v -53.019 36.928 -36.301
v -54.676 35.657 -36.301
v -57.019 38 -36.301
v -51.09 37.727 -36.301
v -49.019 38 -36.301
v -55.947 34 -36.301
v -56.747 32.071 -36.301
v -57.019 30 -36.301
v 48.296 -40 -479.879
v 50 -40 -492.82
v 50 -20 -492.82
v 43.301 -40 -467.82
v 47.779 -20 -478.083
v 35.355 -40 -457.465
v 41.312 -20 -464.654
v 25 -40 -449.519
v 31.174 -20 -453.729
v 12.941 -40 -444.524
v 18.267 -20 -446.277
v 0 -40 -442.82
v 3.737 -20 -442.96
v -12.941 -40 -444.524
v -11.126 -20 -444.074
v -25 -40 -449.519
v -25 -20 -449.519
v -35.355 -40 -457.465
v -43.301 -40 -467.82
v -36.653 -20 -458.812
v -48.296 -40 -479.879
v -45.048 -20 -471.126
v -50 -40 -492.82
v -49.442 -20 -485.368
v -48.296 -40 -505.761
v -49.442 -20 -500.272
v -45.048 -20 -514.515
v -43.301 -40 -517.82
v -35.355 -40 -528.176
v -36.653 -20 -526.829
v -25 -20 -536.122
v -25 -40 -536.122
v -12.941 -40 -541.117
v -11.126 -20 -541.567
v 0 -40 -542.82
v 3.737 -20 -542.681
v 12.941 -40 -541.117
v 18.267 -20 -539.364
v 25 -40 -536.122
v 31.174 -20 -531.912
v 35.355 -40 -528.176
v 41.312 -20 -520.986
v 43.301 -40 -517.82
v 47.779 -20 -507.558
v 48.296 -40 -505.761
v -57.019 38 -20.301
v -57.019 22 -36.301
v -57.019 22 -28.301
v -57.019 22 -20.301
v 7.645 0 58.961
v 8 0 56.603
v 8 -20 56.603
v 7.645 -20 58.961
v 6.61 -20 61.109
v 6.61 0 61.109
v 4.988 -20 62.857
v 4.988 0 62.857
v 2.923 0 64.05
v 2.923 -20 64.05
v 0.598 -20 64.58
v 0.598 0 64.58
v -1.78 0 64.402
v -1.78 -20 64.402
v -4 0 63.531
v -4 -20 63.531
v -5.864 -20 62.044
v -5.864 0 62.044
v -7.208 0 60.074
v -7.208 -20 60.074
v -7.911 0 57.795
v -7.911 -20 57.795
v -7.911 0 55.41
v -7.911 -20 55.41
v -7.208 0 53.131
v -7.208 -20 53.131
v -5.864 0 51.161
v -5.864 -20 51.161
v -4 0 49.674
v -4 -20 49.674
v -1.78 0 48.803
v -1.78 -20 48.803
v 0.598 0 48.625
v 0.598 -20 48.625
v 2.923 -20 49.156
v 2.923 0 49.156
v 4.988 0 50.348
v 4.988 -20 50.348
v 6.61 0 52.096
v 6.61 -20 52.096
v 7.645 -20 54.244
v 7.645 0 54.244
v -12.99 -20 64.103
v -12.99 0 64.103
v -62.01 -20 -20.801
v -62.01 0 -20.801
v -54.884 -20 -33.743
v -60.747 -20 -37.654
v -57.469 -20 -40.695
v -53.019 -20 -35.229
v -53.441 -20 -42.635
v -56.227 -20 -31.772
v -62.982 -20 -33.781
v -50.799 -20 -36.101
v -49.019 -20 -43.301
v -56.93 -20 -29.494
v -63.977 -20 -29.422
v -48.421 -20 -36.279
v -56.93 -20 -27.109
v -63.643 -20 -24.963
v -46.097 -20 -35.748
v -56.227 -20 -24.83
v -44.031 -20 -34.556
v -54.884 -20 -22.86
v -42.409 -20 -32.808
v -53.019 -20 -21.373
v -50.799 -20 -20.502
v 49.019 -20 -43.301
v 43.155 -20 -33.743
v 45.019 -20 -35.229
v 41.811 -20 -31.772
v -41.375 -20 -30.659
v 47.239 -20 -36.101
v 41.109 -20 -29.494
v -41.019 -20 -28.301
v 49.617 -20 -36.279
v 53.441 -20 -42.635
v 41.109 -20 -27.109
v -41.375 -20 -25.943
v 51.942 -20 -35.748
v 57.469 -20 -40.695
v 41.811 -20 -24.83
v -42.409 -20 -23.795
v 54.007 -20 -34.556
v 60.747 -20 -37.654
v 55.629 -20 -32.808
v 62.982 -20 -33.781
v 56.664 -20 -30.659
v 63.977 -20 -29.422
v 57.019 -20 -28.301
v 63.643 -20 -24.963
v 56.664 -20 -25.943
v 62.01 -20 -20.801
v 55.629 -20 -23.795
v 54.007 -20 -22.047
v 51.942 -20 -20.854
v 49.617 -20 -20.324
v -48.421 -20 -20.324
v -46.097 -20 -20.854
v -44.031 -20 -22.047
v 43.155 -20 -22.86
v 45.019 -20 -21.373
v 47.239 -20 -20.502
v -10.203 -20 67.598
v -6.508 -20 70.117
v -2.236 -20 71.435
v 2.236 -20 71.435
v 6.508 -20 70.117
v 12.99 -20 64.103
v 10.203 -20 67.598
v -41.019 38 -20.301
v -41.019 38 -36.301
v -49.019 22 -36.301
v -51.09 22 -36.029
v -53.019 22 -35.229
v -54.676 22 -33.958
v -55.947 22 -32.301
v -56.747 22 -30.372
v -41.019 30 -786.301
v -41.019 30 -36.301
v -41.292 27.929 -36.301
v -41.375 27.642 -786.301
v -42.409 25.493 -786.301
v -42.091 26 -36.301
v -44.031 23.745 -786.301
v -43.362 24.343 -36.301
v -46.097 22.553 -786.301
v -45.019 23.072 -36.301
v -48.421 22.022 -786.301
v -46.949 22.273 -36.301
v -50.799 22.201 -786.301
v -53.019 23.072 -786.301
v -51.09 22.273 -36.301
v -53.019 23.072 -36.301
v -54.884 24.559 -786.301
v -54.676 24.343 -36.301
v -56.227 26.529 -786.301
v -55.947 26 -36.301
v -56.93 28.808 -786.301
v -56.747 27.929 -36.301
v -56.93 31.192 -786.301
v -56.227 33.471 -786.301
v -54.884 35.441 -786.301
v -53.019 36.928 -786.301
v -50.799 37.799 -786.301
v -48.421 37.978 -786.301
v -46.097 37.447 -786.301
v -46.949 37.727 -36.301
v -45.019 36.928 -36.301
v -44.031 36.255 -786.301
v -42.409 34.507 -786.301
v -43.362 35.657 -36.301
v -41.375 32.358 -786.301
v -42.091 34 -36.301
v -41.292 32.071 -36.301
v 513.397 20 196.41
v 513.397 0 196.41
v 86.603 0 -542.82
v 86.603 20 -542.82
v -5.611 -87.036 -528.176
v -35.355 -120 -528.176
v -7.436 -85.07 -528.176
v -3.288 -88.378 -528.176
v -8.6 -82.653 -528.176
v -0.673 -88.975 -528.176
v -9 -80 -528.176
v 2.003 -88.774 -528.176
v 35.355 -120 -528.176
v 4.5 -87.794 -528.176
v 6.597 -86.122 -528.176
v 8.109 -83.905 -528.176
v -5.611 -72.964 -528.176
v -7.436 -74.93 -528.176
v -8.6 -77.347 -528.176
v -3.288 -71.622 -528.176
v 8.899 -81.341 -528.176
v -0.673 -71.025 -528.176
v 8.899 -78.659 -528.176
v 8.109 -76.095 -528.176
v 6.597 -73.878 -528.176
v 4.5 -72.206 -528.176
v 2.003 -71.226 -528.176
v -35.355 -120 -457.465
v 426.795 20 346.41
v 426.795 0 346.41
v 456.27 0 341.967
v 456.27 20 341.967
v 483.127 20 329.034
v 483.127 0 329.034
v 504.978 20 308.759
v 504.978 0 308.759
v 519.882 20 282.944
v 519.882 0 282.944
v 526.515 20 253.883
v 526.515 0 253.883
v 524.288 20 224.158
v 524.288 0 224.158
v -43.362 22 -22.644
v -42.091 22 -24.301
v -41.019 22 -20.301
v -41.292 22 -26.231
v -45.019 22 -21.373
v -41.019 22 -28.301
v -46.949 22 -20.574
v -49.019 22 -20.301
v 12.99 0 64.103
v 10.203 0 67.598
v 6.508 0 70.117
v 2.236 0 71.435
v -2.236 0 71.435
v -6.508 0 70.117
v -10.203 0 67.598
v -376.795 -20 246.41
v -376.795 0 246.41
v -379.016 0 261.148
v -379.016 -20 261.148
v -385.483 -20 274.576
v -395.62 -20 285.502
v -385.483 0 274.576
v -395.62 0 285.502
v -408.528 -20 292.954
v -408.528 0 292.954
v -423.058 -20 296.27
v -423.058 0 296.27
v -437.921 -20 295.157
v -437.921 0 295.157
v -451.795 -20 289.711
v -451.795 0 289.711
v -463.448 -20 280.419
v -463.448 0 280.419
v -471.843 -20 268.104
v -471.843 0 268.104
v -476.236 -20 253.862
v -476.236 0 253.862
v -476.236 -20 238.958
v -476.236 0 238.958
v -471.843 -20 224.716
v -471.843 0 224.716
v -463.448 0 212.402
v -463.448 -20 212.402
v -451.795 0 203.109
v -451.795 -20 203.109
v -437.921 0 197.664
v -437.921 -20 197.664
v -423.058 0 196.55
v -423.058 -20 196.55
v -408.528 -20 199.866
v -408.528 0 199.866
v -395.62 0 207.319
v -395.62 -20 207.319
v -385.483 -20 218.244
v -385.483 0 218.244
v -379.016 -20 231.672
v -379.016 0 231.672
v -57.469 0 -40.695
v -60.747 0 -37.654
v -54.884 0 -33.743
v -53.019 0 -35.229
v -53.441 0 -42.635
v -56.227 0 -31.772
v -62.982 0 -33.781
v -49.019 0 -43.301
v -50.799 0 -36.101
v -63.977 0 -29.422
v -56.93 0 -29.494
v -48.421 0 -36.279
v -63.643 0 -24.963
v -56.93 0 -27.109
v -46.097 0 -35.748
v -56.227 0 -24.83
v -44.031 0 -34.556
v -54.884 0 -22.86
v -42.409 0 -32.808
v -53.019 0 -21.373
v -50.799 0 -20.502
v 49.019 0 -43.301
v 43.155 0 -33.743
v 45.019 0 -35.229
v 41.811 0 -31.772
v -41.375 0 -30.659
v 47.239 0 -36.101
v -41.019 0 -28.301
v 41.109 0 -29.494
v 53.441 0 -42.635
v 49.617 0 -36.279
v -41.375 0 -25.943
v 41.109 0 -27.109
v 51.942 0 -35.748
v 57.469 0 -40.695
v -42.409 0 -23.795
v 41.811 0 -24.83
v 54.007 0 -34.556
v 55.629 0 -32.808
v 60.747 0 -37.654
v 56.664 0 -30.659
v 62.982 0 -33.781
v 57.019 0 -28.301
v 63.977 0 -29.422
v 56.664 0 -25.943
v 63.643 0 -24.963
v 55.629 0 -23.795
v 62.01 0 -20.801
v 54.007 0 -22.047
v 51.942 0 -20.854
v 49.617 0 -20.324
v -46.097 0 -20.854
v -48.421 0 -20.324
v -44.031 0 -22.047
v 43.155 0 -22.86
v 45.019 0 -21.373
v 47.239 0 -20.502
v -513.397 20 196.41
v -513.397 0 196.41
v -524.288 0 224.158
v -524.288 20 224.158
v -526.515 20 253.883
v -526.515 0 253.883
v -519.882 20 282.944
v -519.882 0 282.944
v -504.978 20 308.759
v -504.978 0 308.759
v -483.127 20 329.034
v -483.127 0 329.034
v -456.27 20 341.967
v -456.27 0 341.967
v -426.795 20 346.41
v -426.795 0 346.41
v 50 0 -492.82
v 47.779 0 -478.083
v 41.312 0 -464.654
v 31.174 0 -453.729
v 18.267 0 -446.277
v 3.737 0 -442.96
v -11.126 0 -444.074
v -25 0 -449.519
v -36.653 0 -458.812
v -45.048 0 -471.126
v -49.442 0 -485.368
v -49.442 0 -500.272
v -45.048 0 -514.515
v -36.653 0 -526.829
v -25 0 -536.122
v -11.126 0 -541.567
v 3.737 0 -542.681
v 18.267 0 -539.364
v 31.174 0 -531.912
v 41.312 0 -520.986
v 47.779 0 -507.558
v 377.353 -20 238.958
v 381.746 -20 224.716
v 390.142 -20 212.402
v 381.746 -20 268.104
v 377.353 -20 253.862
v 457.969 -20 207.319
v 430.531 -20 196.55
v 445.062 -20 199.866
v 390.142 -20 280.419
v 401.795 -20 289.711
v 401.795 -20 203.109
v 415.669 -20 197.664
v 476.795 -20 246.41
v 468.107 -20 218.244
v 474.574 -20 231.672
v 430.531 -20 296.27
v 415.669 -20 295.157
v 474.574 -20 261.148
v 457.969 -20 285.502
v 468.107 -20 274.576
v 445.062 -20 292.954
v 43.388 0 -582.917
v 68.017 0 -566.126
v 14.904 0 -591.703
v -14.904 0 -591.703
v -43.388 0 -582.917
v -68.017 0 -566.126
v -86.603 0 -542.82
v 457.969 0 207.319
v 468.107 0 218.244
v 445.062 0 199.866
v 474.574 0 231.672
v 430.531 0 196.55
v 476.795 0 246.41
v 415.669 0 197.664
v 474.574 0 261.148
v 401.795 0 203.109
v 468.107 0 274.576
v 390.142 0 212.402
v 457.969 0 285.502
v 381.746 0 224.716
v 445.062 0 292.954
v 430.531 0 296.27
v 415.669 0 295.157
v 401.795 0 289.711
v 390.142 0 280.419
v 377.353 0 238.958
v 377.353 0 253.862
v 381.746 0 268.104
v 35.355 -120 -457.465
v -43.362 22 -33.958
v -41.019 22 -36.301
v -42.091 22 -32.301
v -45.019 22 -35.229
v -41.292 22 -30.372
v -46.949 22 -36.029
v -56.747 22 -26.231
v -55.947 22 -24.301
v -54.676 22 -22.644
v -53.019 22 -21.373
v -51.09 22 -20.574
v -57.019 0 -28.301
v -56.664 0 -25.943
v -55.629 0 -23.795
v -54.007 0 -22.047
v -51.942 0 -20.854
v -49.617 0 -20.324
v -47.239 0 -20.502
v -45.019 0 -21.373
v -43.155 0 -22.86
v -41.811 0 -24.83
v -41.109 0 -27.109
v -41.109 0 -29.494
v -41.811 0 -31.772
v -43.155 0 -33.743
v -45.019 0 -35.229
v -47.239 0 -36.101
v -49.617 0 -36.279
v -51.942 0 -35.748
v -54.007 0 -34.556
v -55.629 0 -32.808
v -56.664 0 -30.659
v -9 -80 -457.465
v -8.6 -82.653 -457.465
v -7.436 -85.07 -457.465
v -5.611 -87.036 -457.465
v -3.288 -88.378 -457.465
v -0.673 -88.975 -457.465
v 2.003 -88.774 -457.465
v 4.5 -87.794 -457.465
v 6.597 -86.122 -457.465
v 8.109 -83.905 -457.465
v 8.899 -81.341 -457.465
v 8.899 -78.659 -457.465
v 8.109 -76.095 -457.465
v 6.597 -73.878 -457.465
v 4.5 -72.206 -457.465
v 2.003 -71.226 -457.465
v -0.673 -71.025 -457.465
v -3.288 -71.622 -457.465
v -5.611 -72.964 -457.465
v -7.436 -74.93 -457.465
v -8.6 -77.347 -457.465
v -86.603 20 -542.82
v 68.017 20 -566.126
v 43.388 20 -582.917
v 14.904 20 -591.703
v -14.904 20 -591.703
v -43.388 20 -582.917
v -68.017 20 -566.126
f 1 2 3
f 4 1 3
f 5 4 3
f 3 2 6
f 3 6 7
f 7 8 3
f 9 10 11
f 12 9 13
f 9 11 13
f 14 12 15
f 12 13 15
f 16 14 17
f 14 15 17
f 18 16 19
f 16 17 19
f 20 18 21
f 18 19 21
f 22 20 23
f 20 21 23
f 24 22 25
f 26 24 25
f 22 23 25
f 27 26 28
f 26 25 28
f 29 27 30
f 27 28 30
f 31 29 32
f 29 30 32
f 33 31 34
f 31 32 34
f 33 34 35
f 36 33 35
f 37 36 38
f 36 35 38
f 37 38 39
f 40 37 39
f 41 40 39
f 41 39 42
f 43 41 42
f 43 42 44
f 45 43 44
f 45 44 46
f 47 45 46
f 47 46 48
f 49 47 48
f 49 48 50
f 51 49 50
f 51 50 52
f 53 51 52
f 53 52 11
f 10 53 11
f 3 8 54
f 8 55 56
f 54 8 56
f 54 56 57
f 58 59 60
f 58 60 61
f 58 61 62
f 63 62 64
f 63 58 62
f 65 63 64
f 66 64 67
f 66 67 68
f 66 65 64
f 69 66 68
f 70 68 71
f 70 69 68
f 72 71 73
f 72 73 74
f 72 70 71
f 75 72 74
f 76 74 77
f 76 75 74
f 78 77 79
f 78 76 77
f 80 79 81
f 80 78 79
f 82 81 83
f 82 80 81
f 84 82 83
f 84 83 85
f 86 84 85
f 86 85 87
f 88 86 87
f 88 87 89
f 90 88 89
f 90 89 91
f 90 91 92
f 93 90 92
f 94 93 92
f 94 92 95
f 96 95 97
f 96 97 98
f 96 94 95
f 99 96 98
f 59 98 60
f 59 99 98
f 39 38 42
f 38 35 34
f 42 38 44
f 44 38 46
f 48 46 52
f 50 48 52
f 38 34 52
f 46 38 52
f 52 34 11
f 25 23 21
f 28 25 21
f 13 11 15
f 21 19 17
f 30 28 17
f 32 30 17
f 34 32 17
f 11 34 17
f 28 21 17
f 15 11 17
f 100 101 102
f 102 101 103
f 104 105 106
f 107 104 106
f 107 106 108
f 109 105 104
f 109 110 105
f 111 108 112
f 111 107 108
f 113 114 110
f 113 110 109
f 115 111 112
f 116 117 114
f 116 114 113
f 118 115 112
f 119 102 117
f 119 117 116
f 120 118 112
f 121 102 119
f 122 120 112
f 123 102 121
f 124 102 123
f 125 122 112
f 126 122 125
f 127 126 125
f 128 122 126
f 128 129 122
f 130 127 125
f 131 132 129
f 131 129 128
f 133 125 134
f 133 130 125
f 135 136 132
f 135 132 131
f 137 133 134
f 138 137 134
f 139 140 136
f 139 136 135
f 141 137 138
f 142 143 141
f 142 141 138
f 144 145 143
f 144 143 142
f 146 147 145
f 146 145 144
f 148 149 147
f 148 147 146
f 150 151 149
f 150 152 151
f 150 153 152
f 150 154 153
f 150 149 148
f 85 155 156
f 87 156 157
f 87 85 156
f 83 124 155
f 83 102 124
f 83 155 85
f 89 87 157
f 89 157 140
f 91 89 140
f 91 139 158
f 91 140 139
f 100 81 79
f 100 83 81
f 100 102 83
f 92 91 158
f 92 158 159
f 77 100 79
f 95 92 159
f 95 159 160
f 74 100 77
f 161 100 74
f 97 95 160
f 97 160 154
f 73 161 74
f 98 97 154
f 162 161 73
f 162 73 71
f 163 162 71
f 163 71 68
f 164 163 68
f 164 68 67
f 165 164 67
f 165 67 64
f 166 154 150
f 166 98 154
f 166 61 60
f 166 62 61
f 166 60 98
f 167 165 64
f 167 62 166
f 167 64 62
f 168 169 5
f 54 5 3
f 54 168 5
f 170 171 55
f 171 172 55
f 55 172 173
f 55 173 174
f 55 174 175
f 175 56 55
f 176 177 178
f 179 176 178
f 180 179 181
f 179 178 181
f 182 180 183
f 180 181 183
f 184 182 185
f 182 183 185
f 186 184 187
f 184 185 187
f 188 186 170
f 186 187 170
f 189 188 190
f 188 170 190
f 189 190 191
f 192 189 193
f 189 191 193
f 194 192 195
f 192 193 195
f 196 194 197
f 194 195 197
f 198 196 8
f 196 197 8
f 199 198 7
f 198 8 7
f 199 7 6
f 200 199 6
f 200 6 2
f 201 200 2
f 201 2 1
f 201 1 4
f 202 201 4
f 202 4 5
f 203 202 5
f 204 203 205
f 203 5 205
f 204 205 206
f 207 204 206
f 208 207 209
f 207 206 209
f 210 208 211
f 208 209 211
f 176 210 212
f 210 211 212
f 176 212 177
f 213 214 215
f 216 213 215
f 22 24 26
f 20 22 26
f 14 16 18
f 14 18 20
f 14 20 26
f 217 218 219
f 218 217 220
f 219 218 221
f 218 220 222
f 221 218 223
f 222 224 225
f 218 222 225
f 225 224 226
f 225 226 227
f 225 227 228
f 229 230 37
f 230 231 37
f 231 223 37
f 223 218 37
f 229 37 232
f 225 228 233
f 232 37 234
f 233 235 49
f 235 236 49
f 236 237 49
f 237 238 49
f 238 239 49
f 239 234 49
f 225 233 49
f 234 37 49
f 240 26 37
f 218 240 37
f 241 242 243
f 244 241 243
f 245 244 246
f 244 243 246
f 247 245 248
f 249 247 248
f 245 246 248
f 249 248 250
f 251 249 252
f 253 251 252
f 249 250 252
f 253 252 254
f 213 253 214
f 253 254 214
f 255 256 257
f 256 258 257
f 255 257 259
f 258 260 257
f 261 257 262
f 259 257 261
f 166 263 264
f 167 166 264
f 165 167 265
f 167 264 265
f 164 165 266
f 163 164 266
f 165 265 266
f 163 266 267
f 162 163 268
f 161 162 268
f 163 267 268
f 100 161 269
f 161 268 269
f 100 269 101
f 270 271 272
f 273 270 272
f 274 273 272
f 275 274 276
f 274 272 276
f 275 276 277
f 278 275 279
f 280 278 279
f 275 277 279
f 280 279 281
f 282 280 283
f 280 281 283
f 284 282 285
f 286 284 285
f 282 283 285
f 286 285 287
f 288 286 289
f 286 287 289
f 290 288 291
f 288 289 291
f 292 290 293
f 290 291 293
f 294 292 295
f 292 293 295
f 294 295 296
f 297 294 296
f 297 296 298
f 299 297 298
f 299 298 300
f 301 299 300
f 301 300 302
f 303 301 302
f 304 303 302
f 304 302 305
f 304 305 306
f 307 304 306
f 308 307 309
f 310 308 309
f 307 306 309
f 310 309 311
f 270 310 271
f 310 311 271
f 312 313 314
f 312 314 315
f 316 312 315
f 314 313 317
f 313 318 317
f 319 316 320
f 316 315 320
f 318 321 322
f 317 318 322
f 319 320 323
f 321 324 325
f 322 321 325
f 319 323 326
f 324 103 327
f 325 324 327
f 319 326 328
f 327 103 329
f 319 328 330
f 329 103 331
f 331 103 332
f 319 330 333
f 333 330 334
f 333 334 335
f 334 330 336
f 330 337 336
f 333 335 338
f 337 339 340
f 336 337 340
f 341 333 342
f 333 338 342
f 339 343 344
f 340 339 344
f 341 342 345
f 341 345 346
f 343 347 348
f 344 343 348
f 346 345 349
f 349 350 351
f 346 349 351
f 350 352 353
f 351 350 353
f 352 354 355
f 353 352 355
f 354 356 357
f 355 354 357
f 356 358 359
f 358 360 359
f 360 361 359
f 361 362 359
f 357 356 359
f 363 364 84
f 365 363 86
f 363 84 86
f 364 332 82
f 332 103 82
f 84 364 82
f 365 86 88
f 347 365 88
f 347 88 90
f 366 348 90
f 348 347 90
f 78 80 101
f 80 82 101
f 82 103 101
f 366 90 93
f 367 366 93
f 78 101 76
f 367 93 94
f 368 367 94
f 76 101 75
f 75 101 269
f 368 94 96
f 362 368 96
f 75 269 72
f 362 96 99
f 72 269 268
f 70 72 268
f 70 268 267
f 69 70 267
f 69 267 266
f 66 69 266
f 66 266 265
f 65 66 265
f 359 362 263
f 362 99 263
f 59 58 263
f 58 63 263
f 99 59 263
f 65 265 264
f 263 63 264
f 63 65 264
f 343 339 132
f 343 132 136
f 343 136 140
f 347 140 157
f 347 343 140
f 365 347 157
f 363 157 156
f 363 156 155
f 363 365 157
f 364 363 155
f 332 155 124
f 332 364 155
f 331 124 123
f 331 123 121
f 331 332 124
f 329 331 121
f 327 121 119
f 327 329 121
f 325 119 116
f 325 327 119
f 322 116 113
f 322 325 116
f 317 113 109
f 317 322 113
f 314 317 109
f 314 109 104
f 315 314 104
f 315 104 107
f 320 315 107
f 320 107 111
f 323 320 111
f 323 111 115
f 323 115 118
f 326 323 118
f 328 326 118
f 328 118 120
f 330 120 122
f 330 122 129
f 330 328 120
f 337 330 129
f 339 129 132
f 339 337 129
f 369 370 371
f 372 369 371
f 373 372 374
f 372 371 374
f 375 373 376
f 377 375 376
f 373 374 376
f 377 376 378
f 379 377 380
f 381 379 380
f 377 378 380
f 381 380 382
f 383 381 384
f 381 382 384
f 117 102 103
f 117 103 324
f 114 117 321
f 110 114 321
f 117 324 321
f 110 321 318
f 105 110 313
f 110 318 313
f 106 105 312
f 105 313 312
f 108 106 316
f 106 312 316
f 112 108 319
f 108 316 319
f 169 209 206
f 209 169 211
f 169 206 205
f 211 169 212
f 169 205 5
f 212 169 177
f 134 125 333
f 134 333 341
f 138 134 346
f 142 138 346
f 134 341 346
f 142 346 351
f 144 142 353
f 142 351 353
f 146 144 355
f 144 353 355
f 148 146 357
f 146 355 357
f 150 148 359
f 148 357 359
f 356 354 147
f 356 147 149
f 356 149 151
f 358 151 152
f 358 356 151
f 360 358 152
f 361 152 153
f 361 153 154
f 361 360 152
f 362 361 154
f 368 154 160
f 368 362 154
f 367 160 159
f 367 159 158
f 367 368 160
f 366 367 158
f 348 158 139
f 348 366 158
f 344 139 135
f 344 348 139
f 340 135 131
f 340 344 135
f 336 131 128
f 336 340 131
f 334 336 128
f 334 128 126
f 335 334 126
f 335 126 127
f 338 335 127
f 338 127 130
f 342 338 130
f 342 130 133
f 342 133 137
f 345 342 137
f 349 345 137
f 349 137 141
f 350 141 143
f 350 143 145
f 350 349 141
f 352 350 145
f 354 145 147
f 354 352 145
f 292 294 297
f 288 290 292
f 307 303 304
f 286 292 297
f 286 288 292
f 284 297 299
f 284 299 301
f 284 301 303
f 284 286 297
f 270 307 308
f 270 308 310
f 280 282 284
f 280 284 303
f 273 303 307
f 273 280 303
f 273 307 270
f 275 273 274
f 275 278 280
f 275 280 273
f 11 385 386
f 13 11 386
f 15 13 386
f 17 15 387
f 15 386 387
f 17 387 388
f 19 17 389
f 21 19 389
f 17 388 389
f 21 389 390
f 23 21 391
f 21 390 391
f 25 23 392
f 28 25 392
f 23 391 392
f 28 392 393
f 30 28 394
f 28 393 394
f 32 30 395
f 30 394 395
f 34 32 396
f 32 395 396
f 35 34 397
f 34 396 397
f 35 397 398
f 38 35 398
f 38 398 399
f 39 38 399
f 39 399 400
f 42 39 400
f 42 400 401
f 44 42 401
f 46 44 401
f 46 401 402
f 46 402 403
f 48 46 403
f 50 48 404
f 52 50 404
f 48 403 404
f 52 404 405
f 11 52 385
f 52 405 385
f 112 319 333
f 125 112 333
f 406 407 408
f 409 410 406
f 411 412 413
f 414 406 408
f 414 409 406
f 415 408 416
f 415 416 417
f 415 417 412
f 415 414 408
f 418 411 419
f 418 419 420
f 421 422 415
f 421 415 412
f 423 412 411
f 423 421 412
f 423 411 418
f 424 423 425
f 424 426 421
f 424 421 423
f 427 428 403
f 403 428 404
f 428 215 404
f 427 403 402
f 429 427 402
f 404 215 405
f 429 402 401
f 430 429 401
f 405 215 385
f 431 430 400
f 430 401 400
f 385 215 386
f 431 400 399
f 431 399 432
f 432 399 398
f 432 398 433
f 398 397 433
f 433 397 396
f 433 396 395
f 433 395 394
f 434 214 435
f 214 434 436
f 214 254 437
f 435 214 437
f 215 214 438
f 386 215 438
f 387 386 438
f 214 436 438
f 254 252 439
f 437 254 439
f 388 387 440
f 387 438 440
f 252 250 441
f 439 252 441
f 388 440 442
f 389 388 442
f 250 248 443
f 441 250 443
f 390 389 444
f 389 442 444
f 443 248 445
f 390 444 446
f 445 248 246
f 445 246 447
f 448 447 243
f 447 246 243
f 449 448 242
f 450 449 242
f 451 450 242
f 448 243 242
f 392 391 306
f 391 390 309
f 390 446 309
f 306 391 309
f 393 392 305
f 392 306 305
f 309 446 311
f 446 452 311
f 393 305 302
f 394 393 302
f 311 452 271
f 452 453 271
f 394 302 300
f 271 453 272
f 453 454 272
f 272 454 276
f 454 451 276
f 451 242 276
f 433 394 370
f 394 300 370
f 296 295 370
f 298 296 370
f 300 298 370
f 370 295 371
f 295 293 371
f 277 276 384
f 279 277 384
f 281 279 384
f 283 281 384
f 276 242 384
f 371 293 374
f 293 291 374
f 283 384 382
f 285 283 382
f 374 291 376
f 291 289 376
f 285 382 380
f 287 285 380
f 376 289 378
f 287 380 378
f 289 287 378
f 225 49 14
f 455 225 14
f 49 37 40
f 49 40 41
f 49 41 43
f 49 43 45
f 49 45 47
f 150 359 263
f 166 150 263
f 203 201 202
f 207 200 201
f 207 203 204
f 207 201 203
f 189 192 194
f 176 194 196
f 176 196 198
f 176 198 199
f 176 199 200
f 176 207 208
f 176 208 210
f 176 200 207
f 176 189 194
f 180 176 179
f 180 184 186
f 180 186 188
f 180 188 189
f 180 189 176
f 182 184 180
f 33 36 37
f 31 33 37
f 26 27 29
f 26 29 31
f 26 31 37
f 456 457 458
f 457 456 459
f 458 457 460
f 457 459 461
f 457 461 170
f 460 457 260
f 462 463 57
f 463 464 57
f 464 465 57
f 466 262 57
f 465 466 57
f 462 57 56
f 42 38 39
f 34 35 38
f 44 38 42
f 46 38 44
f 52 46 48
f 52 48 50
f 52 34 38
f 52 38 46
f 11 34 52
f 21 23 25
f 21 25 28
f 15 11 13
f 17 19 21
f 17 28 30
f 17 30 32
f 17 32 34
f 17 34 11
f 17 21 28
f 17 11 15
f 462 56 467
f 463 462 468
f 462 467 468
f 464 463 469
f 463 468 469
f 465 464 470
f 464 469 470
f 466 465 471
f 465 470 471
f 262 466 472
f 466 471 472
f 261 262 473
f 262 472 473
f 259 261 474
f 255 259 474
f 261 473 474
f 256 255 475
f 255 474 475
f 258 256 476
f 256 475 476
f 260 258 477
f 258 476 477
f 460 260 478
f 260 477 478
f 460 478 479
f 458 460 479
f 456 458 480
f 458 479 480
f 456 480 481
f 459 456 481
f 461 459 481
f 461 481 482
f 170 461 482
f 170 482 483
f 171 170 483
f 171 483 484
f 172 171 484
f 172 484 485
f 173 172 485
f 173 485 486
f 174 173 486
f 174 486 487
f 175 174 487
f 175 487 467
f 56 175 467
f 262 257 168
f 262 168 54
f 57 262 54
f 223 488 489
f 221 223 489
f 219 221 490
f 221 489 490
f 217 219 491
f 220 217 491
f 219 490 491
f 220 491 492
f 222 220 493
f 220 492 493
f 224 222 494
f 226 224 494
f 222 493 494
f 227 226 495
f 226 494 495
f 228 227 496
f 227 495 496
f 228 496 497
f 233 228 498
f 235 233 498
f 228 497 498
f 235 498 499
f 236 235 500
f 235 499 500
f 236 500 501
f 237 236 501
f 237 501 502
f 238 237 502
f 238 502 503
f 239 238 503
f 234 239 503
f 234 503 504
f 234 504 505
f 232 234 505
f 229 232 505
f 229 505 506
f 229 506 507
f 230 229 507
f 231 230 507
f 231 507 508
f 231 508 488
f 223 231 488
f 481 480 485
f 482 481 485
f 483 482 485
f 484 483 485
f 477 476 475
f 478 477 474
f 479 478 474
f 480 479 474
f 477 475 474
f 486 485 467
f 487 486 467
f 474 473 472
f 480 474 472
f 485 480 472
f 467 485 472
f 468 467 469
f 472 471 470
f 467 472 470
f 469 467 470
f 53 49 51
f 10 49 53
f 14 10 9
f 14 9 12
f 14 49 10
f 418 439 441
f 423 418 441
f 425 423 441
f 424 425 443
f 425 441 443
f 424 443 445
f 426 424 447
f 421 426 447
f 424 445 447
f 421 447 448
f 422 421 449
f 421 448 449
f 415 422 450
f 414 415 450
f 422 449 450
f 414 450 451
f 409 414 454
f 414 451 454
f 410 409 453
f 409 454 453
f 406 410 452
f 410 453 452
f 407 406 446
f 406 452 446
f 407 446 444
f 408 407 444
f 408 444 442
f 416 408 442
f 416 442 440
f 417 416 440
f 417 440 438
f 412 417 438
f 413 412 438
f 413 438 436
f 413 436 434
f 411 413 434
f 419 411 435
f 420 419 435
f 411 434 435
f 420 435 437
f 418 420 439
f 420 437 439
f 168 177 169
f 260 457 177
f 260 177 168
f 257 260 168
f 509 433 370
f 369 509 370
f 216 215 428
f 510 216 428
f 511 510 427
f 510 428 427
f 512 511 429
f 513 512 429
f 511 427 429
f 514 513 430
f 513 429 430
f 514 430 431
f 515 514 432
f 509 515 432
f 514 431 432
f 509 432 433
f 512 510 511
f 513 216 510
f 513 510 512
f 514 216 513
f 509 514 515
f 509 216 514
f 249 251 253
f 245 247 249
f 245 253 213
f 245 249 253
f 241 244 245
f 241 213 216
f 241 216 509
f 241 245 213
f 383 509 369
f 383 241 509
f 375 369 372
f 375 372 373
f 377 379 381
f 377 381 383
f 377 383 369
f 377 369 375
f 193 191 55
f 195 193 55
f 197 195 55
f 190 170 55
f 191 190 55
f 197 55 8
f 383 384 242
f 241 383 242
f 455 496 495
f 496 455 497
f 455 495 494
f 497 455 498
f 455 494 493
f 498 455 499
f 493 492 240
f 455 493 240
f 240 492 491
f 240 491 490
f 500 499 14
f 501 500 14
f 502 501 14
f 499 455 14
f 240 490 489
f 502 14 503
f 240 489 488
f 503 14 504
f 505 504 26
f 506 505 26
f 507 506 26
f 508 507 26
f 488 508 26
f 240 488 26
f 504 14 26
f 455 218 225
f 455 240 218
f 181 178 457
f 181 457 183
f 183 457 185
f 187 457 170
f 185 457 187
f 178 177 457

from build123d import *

# Parameters (mm, degrees)
F0_R      = 8
F1_DEPTH  = 20
F2_R      = 8
F3_DEPTH  = 22
F4_W      = 16
F4_H      = 16
F5_DEPTH  = 16
F6_R      = 8
F7_DEPTH  = 750
F9_DEPTH  = 20
F10_R     = 50
F11_DEPTH = 20
F12_R     = 50
F13_DEPTH = 20
F15_DEPTH = 80
F17_DEPTH = 100


with BuildPart() as f1:
    # F0 (on Front) → F1 (new body)
    with BuildSketch(Plane.XZ):
        with BuildLine():
            Line((-12.990381, 64.10254), (-62.009619, -20.80127))
            ThreePointArc((-62.009619, -20.80127), (-62.009619, -35.80127), (-49.019238, -43.30127))
            Line((-49.019238, -43.30127), (49.019238, -43.30127))
            ThreePointArc((49.019238, -43.30127), (62.009619, -35.80127), (62.009619, -20.80127))
            Line((62.009619, -20.80127), (12.990381, 64.10254))
            ThreePointArc((12.990381, 64.10254), (0, 71.60254), (-12.990381, 64.10254))
        make_face()
        with Locations((-49.019238, -28.30127)):
            Circle(F0_R, mode=Mode.SUBTRACT)
        with Locations((49.019238, -28.30127)):
            Circle(F0_R, mode=Mode.SUBTRACT)
        with Locations((0, 56.60254)):
            Circle(F0_R, mode=Mode.SUBTRACT)
    extrude(amount=F1_DEPTH)


with BuildPart() as f3:
    # F2 (on face) → F3 (new body)
    with BuildSketch(Plane(origin=(0, 0, 0), x_dir=(-1, 0, 0), z_dir=(0, 1, 0))):
        with Locations((49.019238, -28.30127)):
            Circle(F2_R)
    extrude(amount=F3_DEPTH)

    # F4 (on face) → F5 (join)
    with BuildSketch(Plane(origin=(0, 22, 0), x_dir=(-1, 0, 0), z_dir=(0, 1, 0))):
        with Locations((49.019238, -28.30127)):
            Rectangle(F4_W, F4_H)
    extrude(amount=F5_DEPTH)

    # F6 (on face) → F7 (join)
    with BuildSketch(Plane(origin=(0, 0, -36.30127), x_dir=(1, 0, 0), z_dir=(0, 0, -1))):
        with Locations((-49.019238, -30)):
            Circle(F6_R)
    extrude(amount=F7_DEPTH)


with BuildPart() as f9:
    # F8 (on face) → F9 (new body)
    with BuildSketch(Plane(origin=(0, 0, 0), x_dir=(-1, 0, 0), z_dir=(0, 1, 0))):
        with BuildLine():
            Line((86.60254, -542.820323), (513.39746, 196.410162))
            ThreePointArc((513.39746, 196.410162), (513.39746, 296.410162), (426.794919, 346.410162))
            Line((426.794919, 346.410162), (-426.794919, 346.410162))
            ThreePointArc((-426.794919, 346.410162), (-513.39746, 296.410162), (-513.39746, 196.410162))
            Line((-513.39746, 196.410162), (-86.60254, -542.820323))
            ThreePointArc((-86.60254, -542.820323), (0, -592.820323), (86.60254, -542.820323))
        make_face()
    extrude(amount=F9_DEPTH)

    # F10 (on face) → F11 (join)
    with BuildSketch(Plane.XZ):
        with Locations((0, -492.820323)):
            Circle(F10_R)
        with Locations((-426.794919, 246.410162)):
            Circle(F10_R)
        with Locations((426.794919, 246.410162)):
            Circle(F10_R)
    extrude(amount=F11_DEPTH)


with BuildPart() as f13:
    # F12 (on face) → F13 (new body)
    with BuildSketch(Plane.XZ.offset(20)):
        with Locations((0, -492.820323)):
            Circle(F12_R)
    extrude(amount=F13_DEPTH)

    # F14 (on face) → F15 (join)
    with BuildSketch(Plane.XZ.offset(40)):
        Polygon((35.355339, -457.464984), (-35.355339, -528.175662), (35.355339, -528.175662), align=None)
        Polygon((-35.355339, -457.464984), (-35.355339, -528.175662), (35.355339, -457.464984), align=None)
    extrude(amount=F15_DEPTH)

    # F16 (on face) → F17 (cut)
    with BuildSketch(Plane.XY.offset(-457.464984)):
        with BuildLine():
            Line((-9, -80), (9, -80))
            ThreePointArc((9, -80), (0, -71), (-9, -80))
        make_face()
        with BuildLine():
            ThreePointArc((-9, -80), (0, -89), (9, -80))
            Line((9, -80), (-9, -80))
        make_face()
    extrude(amount=-F17_DEPTH, mode=Mode.SUBTRACT)


solid = Compound([f1.part, f3.part, f9.part, f13.part])
